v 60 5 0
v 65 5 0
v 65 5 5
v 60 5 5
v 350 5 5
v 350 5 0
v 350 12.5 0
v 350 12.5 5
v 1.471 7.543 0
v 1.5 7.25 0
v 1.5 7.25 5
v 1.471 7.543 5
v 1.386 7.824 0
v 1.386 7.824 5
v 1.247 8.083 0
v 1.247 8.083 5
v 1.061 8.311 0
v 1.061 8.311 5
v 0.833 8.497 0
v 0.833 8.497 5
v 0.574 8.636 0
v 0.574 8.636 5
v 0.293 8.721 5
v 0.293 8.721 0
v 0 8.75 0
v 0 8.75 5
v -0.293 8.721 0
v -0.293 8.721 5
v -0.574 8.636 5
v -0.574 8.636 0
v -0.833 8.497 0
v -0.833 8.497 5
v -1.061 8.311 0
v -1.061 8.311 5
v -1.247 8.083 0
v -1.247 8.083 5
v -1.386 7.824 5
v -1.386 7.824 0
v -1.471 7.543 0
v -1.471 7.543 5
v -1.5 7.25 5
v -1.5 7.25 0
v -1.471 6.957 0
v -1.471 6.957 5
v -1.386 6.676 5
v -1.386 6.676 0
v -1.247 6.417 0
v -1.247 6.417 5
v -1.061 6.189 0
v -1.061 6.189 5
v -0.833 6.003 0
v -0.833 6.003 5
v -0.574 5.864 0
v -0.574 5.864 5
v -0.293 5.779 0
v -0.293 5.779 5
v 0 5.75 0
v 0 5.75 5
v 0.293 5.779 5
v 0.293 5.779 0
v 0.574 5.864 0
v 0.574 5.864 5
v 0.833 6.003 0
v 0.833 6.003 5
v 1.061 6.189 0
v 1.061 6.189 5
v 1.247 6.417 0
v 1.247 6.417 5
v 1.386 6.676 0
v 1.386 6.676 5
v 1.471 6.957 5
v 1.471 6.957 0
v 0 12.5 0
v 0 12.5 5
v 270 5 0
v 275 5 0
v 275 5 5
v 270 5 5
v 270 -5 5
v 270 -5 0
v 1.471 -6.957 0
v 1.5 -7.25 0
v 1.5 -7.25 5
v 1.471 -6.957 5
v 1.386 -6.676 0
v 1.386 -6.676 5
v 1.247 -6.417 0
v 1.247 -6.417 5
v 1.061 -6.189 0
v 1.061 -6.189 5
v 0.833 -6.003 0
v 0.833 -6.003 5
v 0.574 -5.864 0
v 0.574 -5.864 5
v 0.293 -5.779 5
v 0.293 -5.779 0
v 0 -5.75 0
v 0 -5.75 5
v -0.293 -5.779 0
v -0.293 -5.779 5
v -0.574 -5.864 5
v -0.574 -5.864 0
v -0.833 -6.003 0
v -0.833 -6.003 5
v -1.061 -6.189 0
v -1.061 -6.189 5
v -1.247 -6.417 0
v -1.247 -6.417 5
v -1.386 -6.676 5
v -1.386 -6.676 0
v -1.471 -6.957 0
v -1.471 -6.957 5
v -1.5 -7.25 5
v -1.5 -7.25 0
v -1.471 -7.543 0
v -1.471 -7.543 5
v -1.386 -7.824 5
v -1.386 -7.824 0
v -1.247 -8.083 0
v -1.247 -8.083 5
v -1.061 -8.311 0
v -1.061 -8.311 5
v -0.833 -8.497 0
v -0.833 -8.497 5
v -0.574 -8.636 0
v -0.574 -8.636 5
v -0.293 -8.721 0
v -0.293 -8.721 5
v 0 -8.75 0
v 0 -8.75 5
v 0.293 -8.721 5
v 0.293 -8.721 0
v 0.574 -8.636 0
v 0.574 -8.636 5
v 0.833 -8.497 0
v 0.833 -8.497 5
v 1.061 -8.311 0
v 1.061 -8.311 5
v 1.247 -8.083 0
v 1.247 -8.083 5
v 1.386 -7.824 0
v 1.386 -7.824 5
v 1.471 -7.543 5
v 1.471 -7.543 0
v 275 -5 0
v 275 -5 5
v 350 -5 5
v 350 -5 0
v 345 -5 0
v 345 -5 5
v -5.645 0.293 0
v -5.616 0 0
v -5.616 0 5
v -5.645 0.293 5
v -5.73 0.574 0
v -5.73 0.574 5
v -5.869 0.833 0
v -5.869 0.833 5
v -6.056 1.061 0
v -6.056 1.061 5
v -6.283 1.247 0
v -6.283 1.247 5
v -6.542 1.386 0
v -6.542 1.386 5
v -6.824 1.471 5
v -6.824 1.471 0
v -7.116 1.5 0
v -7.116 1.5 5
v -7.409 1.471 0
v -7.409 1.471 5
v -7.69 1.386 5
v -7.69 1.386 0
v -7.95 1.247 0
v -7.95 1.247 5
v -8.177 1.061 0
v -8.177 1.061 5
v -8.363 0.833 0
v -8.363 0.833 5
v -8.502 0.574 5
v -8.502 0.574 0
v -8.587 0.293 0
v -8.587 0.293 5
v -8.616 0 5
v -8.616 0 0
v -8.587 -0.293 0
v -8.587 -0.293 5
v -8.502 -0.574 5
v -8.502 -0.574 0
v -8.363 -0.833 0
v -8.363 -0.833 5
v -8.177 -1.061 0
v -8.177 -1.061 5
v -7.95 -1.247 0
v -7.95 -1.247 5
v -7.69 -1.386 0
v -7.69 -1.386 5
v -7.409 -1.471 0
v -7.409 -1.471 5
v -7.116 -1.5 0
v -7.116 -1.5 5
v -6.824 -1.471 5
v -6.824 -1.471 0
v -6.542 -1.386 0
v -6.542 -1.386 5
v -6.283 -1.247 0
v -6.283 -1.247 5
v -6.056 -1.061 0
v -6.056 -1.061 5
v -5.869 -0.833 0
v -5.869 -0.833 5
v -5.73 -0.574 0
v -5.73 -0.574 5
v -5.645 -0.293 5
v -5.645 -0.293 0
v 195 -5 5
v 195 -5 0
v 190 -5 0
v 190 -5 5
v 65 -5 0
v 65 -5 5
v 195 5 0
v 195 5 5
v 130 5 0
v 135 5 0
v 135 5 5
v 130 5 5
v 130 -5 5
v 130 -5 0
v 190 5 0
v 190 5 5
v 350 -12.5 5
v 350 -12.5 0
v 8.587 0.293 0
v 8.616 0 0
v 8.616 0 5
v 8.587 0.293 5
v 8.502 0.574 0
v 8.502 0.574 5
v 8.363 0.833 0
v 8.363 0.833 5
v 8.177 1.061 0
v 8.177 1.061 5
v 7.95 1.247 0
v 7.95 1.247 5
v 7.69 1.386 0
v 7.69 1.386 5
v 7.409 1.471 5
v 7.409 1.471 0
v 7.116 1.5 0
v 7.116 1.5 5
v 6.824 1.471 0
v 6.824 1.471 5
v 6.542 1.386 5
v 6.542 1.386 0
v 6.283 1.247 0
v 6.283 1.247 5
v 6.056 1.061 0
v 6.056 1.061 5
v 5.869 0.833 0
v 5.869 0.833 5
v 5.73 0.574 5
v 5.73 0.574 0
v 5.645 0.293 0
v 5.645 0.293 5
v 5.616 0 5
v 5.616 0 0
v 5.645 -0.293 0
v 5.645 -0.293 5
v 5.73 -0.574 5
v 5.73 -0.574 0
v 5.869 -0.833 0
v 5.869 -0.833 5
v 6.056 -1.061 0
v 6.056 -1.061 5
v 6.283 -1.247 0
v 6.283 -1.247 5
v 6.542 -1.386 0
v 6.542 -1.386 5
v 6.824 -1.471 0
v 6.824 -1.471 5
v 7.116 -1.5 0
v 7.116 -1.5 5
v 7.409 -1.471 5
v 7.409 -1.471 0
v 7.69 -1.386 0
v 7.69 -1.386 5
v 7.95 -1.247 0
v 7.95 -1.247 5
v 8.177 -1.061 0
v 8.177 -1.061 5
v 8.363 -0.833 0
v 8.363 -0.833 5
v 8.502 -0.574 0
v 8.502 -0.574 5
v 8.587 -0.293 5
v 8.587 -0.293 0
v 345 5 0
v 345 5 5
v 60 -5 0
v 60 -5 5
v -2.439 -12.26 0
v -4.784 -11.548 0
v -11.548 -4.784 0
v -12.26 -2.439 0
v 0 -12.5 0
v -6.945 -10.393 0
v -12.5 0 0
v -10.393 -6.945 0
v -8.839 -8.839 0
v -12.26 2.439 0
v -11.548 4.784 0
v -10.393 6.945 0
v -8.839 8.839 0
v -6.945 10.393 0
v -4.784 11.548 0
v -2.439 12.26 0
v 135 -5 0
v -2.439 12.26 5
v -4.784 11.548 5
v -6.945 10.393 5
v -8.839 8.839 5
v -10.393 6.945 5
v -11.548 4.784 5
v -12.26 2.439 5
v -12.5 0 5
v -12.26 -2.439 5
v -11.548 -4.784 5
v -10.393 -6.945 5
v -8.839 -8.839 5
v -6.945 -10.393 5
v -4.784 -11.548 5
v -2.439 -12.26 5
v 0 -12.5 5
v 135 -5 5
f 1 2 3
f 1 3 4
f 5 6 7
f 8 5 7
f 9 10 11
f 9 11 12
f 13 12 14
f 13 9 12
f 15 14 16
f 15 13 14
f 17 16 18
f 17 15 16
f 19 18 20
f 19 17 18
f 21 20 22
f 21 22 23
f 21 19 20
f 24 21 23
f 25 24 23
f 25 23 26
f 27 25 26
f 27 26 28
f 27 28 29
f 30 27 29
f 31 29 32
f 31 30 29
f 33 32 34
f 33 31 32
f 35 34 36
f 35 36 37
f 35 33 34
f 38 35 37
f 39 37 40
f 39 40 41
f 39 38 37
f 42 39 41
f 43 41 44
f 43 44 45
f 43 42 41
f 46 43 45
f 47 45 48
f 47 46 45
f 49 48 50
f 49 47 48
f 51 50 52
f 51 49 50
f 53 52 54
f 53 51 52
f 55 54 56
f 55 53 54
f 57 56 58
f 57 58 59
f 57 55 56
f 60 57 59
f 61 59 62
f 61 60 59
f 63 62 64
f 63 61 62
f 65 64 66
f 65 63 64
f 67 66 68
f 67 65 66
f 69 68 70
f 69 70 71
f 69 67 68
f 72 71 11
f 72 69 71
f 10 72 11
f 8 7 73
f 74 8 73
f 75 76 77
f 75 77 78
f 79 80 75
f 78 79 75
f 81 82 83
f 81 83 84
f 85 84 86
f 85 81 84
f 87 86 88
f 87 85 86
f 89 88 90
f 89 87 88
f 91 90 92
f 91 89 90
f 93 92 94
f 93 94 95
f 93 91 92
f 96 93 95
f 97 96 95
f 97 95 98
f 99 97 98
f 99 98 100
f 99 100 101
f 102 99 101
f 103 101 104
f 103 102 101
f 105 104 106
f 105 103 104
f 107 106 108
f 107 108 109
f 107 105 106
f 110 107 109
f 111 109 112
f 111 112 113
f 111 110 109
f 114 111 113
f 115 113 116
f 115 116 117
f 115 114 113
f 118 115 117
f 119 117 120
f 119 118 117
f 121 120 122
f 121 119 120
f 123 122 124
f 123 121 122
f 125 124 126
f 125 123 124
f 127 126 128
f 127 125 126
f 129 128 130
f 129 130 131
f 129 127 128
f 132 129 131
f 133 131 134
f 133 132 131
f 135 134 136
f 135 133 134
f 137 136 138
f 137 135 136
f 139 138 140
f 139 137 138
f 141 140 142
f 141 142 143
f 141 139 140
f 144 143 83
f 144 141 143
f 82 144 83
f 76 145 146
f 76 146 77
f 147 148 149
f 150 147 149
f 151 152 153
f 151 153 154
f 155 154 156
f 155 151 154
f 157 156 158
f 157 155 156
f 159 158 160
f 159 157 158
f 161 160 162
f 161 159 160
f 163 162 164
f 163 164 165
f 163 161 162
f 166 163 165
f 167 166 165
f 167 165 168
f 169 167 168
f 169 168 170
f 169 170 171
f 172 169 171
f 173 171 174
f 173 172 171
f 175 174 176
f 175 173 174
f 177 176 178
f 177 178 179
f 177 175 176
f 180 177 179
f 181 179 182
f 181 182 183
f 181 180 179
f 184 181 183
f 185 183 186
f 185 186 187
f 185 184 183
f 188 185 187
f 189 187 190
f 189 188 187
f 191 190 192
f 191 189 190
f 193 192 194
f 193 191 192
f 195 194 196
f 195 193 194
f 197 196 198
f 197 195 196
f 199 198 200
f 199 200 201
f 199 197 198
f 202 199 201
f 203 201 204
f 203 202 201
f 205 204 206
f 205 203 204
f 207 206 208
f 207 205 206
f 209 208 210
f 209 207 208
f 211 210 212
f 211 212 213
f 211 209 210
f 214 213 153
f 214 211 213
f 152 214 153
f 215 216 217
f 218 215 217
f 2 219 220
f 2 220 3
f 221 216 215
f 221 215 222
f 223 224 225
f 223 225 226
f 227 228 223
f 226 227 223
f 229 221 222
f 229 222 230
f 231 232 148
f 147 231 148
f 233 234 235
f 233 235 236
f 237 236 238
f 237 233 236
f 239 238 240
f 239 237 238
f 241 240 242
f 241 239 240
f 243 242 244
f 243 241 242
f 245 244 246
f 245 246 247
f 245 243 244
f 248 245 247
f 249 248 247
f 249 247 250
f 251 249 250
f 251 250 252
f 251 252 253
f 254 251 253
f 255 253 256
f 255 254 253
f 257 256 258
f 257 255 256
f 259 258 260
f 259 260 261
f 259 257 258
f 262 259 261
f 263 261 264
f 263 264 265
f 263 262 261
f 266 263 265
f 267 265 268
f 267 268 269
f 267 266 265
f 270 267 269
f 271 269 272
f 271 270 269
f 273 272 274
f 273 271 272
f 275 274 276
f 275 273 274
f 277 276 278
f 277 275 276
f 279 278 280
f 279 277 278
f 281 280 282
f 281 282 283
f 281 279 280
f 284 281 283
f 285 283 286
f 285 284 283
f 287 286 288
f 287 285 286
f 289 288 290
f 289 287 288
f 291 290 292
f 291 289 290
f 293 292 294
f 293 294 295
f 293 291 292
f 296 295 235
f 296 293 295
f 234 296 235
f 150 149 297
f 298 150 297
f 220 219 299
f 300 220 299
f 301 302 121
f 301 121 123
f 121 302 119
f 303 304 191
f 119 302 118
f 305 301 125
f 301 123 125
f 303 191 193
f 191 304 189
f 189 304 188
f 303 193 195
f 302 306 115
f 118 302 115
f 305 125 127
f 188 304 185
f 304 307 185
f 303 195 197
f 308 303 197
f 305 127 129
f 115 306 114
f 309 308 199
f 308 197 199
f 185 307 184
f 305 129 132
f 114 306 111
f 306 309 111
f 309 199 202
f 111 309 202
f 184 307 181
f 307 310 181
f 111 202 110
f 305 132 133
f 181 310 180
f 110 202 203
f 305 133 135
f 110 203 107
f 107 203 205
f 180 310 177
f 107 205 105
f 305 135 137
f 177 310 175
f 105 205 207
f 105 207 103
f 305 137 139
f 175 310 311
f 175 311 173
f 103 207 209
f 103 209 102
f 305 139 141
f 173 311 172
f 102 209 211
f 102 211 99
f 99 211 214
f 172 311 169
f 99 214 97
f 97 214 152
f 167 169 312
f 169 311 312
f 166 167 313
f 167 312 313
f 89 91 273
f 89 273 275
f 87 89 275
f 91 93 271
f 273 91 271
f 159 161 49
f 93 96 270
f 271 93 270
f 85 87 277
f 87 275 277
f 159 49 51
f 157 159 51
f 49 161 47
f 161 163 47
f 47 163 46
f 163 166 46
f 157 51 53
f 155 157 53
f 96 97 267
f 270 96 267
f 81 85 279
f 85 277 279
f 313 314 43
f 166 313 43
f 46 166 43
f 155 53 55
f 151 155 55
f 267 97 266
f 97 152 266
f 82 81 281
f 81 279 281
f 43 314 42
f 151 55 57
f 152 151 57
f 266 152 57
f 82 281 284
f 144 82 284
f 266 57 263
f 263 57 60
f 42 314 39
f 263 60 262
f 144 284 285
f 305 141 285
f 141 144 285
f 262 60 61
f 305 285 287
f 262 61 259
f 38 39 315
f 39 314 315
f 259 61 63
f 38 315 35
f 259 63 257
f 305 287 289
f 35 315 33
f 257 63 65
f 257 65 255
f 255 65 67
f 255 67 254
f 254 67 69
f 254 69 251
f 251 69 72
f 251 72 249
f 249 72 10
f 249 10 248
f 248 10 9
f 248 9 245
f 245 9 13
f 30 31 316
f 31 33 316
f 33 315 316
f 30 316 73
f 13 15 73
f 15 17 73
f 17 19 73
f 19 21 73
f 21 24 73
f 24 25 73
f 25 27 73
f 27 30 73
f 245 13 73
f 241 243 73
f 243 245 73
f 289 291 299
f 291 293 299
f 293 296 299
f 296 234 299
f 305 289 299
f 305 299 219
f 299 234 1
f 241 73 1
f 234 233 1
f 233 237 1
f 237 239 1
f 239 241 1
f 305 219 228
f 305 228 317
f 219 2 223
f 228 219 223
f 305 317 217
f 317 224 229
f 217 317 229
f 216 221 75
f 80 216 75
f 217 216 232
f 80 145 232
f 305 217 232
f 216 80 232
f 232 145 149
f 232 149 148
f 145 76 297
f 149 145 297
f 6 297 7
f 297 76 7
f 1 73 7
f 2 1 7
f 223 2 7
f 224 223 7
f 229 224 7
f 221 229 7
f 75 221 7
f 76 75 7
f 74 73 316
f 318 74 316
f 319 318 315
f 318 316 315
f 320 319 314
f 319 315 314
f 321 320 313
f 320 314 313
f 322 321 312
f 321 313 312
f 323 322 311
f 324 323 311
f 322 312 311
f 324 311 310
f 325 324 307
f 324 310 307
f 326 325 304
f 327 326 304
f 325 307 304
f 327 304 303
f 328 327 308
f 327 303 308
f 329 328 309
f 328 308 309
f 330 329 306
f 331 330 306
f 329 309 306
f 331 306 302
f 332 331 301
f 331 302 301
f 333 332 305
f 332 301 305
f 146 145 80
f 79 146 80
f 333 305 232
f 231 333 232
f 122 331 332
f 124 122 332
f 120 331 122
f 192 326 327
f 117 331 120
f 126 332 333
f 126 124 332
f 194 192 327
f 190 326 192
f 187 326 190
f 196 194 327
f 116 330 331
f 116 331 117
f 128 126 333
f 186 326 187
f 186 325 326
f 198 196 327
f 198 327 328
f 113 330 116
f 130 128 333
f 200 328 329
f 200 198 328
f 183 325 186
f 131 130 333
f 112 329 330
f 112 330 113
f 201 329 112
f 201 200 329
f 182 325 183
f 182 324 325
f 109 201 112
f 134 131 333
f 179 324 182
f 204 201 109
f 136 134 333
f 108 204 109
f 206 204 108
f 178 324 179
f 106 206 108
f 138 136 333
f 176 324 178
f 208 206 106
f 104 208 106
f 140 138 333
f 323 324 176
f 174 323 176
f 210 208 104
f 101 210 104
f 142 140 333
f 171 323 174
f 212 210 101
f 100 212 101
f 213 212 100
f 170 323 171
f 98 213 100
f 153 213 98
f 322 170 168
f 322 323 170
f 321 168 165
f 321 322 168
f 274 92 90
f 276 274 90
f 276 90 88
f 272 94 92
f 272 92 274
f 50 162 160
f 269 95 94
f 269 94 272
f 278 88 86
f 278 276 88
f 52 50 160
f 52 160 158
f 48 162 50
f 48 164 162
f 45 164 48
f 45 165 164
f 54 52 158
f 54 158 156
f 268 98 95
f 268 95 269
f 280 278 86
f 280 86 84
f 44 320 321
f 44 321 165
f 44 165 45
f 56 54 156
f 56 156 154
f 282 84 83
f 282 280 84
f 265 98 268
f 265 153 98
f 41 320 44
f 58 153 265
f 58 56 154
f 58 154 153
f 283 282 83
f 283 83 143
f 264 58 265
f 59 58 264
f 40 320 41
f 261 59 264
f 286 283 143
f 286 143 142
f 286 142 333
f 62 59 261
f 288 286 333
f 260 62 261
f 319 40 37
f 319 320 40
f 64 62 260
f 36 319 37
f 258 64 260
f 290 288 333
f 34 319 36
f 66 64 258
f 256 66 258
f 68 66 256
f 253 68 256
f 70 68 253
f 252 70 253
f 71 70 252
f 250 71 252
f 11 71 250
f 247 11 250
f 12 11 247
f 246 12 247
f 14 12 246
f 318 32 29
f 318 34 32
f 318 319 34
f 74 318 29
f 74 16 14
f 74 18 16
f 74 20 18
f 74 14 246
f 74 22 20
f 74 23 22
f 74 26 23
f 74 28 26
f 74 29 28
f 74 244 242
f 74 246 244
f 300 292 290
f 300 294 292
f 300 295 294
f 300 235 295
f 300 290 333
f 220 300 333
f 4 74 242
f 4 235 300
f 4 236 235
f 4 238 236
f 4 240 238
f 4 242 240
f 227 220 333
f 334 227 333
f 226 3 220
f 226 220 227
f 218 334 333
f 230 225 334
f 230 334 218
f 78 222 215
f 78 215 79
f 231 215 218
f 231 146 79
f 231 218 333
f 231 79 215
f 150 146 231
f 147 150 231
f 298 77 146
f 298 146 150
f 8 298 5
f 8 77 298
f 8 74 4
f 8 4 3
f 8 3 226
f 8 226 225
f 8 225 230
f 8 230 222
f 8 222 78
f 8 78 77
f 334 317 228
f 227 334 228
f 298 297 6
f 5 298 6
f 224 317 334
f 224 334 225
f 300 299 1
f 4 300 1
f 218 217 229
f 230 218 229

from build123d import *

# Parameters (mm, degrees)
SKETCH_1_R          = 1.5
EXTRUDE_1_DEPTH     = 5
SKETCH_3_W          = 5
SKETCH_3_H          = 10
CUT_EXTRUDE_1_DEPTH = 351.258832865


with BuildPart() as part:
    # 스케치1 → 보스-돌출1 (new body)
    with BuildSketch(Plane.XY):
        with BuildLine():
            Line((0, -12.5), (350, -12.5))
            Line((350, -12.5), (350, -5))
            Line((350, -5), (345, -5))
            Line((345, -5), (345, 5))
            Line((345, 5), (350, 5))
            Line((350, 5), (350, 12.5))
            Line((350, 12.5), (0, 12.5))
            ThreePointArc((0, 12.5), (-12.5, 0), (0, -12.5))
        make_face()
        with Locations((7.116257118, 0)):
            Circle(SKETCH_1_R, mode=Mode.SUBTRACT)
        with Locations((-7.116257118, 0)):
            Circle(SKETCH_1_R, mode=Mode.SUBTRACT)
        with Locations((0, 7.25)):
            Circle(SKETCH_1_R, mode=Mode.SUBTRACT)
        with Locations((0, -7.25)):
            Circle(SKETCH_1_R, mode=Mode.SUBTRACT)
    extrude(amount=EXTRUDE_1_DEPTH)

    # 스케치3 → 컷-돌출1 (cut, through all)
    with BuildSketch(Plane(origin=(0, 0, 0), x_dir=(-1, 0, 0), z_dir=(0, 0, -1))):
        with Locations((-272.5, 0)):
            Rectangle(SKETCH_3_W, SKETCH_3_H)
        with Locations((-192.5, 0)):
            Rectangle(SKETCH_3_W, SKETCH_3_H)
        with Locations((-132.5, 0)):
            Rectangle(SKETCH_3_W, SKETCH_3_H)
        with Locations((-62.5, 0)):
            Rectangle(SKETCH_3_W, SKETCH_3_H)
    extrude(amount=-CUT_EXTRUDE_1_DEPTH, mode=Mode.SUBTRACT)


solid = part.part
